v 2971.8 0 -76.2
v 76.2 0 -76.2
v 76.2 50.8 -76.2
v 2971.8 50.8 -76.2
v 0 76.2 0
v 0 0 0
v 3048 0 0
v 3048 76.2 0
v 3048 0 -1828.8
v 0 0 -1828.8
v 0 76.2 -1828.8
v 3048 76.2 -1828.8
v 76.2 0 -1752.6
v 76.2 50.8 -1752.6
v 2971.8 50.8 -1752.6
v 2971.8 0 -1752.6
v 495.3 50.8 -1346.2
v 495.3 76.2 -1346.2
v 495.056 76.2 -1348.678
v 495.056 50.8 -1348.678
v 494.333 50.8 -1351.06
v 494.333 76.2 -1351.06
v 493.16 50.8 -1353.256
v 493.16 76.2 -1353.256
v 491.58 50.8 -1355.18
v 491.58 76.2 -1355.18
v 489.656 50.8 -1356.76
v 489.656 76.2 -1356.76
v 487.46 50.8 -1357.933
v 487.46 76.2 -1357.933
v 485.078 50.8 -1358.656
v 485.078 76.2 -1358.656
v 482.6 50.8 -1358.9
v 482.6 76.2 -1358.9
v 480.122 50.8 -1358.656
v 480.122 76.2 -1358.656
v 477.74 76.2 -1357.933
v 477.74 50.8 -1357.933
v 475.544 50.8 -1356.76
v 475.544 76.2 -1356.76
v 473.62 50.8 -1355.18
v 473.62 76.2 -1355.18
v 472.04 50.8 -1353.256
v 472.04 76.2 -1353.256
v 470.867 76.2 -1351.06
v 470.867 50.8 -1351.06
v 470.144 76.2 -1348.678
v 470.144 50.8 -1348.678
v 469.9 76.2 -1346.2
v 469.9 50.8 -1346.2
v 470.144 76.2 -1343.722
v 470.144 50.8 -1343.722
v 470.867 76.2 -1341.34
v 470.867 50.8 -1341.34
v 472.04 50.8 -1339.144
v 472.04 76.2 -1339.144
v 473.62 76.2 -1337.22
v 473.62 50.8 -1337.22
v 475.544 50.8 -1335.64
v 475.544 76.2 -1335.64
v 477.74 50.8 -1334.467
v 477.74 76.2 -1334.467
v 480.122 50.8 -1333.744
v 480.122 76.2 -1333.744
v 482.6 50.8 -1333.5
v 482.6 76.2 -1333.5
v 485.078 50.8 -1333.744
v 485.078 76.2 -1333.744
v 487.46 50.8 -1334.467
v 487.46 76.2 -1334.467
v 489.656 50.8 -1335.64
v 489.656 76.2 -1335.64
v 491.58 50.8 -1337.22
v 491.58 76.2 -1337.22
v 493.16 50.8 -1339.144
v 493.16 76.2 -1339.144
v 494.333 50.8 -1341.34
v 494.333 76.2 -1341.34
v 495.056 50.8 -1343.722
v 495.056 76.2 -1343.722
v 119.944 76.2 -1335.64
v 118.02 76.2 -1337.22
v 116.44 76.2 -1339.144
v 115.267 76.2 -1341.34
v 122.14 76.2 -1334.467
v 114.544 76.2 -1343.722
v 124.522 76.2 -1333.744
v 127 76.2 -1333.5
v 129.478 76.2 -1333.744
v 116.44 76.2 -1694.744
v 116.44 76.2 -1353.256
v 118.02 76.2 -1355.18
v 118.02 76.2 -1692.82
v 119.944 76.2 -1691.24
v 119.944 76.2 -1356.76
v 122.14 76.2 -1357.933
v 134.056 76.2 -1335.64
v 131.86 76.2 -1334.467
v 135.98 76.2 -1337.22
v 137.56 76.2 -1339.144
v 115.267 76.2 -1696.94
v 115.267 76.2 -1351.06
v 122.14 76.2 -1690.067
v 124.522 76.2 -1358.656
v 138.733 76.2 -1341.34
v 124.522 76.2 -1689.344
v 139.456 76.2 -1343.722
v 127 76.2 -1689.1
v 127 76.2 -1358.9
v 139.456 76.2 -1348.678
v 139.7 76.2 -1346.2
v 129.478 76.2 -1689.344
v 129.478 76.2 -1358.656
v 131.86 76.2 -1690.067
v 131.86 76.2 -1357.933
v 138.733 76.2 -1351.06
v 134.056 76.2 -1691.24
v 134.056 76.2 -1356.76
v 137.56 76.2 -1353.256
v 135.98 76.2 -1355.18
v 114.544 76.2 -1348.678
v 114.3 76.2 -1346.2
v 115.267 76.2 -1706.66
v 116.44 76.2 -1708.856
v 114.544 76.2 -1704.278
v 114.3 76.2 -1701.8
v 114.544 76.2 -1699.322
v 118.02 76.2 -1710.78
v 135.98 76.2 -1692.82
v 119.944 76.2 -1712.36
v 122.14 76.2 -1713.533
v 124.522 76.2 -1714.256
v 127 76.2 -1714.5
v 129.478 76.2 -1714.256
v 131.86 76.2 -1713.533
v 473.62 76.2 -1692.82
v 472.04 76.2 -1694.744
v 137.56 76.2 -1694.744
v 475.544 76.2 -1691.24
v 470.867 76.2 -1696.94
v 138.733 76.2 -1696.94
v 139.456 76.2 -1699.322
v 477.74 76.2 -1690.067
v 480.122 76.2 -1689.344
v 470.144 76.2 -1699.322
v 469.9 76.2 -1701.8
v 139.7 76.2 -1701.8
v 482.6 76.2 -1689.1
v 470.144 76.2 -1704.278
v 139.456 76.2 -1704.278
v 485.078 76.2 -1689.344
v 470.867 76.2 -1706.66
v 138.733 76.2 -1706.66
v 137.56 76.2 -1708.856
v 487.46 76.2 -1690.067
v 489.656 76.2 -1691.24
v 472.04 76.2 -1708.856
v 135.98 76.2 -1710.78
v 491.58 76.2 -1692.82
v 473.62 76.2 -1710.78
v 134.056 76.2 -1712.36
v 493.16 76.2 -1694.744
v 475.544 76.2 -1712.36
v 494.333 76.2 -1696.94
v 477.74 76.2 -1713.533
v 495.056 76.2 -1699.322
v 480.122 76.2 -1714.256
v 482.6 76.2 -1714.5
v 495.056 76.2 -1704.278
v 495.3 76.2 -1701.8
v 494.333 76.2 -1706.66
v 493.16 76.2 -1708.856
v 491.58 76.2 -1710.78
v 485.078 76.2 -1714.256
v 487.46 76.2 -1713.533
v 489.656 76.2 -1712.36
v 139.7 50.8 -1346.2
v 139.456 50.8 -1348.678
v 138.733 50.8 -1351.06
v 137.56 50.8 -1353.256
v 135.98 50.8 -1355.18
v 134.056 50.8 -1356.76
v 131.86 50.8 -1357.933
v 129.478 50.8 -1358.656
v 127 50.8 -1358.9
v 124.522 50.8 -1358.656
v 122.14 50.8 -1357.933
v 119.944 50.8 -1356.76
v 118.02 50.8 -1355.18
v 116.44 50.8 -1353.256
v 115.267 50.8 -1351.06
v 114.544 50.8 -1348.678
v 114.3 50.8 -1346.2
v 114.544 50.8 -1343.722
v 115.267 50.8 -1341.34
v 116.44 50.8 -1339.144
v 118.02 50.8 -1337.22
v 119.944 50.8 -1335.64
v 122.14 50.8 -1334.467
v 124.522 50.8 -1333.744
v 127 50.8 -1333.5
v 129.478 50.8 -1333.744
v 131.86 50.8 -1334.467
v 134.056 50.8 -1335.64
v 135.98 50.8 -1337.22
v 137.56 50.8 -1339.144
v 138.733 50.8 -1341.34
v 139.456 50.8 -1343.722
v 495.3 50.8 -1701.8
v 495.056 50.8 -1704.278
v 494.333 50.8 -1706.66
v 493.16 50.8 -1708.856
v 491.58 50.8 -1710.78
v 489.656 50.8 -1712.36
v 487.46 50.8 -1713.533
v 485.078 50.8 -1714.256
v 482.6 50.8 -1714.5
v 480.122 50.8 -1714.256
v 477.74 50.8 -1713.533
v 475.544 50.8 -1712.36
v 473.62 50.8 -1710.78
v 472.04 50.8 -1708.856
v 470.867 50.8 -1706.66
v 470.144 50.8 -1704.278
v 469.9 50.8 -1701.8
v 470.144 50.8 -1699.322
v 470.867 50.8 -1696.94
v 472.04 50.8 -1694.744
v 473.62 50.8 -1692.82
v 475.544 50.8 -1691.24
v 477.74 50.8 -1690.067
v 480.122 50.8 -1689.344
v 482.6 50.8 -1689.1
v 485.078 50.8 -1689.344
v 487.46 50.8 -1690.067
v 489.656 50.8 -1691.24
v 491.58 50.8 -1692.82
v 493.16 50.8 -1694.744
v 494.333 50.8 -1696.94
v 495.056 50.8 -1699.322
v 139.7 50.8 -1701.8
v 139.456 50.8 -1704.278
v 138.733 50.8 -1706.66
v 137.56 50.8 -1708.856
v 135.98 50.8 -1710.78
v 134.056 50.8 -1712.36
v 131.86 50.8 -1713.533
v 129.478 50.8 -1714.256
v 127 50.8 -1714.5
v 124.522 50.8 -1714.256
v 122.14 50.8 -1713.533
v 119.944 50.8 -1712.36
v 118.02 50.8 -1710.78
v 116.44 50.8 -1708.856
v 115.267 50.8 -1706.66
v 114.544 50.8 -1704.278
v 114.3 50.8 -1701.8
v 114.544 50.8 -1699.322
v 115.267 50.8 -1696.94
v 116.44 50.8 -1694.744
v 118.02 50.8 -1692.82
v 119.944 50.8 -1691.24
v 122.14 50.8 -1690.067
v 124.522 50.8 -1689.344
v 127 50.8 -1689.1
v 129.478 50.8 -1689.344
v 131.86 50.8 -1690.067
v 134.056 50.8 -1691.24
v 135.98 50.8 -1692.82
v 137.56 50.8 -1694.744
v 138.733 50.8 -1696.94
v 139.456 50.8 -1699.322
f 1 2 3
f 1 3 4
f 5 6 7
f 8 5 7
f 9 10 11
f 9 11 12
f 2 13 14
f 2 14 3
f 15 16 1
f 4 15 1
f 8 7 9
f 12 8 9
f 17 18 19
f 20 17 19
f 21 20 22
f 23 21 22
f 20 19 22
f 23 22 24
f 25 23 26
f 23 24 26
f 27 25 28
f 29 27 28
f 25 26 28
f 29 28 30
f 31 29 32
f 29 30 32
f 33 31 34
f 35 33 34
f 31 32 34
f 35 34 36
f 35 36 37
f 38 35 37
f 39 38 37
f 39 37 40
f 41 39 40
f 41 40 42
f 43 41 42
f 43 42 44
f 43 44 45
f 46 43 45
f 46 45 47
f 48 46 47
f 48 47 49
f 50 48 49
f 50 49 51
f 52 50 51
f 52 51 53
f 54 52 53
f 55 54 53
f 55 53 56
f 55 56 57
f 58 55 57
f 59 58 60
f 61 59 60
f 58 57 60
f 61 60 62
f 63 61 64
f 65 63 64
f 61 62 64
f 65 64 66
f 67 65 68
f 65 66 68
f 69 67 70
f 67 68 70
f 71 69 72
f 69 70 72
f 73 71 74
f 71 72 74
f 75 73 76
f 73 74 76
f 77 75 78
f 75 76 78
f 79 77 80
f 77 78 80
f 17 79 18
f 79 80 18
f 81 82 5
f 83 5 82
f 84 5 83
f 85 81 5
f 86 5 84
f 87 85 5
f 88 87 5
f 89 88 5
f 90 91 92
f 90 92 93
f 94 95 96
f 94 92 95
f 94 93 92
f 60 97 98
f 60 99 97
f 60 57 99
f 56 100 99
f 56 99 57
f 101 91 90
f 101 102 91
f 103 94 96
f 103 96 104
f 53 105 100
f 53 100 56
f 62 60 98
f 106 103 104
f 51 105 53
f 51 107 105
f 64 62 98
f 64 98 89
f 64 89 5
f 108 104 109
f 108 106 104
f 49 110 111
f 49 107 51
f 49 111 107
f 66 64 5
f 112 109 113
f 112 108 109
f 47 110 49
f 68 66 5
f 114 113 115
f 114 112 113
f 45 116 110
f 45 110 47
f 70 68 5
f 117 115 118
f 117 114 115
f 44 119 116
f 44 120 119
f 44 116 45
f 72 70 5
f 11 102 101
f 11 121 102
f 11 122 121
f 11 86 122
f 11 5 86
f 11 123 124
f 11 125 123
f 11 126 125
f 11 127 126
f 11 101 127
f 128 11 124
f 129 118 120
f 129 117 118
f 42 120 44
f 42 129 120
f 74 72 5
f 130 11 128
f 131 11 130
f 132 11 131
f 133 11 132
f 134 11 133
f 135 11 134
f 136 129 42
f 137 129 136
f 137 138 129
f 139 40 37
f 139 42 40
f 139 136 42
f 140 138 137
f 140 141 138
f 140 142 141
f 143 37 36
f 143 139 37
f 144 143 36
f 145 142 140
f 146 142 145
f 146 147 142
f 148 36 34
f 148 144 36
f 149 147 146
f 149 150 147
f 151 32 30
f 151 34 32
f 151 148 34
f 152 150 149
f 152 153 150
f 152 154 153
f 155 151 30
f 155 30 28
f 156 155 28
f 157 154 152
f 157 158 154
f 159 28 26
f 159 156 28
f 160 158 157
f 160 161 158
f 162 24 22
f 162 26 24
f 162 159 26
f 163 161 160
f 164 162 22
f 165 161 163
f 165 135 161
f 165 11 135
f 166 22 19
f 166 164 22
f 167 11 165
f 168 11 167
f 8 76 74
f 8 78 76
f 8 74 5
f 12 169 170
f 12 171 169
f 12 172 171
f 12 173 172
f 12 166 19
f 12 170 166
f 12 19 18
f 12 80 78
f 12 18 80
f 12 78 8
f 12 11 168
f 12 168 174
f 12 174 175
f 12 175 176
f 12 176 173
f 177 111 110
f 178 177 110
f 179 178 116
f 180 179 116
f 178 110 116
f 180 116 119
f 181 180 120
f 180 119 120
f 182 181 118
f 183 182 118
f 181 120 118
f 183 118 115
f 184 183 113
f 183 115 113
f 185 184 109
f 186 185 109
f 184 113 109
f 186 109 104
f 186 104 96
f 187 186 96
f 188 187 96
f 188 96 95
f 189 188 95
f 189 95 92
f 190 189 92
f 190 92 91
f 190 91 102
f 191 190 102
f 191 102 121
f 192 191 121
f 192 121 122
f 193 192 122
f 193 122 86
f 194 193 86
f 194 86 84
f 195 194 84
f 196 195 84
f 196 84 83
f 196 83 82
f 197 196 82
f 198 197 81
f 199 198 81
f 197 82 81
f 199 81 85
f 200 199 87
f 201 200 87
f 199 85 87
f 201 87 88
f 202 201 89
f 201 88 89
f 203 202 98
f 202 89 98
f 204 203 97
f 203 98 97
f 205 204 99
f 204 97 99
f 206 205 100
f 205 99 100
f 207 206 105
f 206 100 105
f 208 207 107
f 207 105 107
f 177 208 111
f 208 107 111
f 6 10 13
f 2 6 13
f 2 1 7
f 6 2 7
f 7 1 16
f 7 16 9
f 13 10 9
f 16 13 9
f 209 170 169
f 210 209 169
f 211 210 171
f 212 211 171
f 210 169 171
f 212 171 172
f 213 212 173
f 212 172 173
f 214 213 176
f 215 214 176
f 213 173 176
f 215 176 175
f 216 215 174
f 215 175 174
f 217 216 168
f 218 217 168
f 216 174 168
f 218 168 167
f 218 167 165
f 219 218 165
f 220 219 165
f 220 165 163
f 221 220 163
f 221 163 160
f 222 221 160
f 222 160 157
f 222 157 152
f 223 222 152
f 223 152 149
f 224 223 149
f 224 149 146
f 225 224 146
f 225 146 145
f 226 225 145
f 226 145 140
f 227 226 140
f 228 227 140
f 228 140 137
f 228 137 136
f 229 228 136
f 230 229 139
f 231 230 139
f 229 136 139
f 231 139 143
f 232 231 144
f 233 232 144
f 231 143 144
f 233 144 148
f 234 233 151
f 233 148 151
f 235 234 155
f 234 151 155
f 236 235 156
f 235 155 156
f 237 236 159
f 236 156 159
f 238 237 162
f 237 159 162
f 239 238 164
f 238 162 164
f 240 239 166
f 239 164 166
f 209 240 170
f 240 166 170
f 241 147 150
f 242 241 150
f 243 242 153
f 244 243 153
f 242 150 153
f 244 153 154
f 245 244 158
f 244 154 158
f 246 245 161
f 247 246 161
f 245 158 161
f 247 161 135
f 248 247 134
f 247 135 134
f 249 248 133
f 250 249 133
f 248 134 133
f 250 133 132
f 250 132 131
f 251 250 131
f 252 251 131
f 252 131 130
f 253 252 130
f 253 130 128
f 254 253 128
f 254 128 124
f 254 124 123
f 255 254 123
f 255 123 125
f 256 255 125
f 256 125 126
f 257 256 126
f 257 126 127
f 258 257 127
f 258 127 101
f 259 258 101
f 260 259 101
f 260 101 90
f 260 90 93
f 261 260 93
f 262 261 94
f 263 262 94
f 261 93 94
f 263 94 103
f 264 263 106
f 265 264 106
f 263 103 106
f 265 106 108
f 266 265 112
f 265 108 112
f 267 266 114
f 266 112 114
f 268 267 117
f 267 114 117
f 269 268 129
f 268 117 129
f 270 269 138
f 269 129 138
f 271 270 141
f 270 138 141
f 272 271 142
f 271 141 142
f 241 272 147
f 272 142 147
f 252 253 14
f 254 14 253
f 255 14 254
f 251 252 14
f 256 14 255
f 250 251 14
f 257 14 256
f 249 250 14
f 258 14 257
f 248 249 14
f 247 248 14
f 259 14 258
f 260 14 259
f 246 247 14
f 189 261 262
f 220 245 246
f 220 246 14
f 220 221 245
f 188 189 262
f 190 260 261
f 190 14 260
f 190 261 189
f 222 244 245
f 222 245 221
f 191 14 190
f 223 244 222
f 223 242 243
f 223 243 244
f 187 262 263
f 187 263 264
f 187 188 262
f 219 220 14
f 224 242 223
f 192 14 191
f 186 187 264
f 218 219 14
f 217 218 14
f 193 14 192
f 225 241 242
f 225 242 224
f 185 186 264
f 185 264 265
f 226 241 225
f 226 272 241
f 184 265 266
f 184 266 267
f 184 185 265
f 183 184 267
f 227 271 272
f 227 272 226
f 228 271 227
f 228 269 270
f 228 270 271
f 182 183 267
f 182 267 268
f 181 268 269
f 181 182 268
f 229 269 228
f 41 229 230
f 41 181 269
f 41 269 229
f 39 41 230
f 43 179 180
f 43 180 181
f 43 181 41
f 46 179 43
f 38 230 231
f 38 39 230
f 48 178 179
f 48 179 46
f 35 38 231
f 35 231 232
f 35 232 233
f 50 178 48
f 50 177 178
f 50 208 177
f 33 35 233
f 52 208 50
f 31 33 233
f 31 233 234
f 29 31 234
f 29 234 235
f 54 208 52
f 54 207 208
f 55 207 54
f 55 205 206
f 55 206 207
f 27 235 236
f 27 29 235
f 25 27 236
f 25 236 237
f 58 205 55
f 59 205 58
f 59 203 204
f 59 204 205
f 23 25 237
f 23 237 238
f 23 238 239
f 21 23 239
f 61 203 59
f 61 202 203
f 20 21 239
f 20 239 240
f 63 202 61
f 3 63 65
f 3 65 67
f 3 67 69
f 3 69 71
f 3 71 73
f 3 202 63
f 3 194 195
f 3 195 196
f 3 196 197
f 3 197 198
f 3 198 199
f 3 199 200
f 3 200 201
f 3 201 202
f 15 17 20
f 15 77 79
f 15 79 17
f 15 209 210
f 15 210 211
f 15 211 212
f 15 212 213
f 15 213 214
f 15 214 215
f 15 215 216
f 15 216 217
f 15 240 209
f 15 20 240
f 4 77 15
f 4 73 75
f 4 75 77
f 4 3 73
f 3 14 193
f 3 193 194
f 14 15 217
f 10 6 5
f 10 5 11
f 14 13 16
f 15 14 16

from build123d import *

# Parameters (mm, degrees)
SKETCH1_W            = 3048
SKETCH1_H            = 1828.8
BOSS_EXTRUDE1_DEPTH  = 76.2
SKETCH2_W            = 2895.6
SKETCH2_H            = 1676.4
CUT_EXTRUDE1_DEPTH   = 50.8
SKETCH3_R            = 12.7
CUT_EXTRUDE2_DEPTH   = 77.2
LPATTERN1_COUNT      = 2
LPATTERN1_PITCH      = 355.6
LPATTERN1_COUNT_DIR2 = 2
LPATTERN1_PITCH_DIR2 = 355.6


with BuildPart() as part:
    # Sketch1 → Boss-Extrude1 (new body)
    with BuildSketch(Plane(origin=(0, 0, 0), x_dir=(1, 0, 0), z_dir=(0, 1, 0))):
        with Locations((1524, 914.4)):
            Rectangle(SKETCH1_W, SKETCH1_H)
    extrude(amount=BOSS_EXTRUDE1_DEPTH)

    # Sketch2 → Cut-Extrude1 (cut)
    with BuildSketch(Plane.XZ):
        with Locations((1524, -914.4)):
            Rectangle(SKETCH2_W, SKETCH2_H)
    extrude(amount=-CUT_EXTRUDE1_DEPTH, mode=Mode.SUBTRACT)

    # Sketch3 → Cut-Extrude2 (cut, through all)
    with BuildSketch(Plane(origin=(0, 76.2, 0), x_dir=(1, 0, 0), z_dir=(0, 1, 0))):
        with Locations((127, 1701.8)):
            Circle(SKETCH3_R)
    cut_extrude2 = extrude(amount=-CUT_EXTRUDE2_DEPTH, mode=Mode.SUBTRACT)

    # LPattern1: Cut-Extrude2 2 × 2
    with Locations(*[(i * LPATTERN1_PITCH, 0, j * LPATTERN1_PITCH_DIR2) for i in range(LPATTERN1_COUNT) for j in range(LPATTERN1_COUNT_DIR2) if (i, j) != (0, 0)]):
        add(cut_extrude2, mode=Mode.SUBTRACT)


solid = part.part
